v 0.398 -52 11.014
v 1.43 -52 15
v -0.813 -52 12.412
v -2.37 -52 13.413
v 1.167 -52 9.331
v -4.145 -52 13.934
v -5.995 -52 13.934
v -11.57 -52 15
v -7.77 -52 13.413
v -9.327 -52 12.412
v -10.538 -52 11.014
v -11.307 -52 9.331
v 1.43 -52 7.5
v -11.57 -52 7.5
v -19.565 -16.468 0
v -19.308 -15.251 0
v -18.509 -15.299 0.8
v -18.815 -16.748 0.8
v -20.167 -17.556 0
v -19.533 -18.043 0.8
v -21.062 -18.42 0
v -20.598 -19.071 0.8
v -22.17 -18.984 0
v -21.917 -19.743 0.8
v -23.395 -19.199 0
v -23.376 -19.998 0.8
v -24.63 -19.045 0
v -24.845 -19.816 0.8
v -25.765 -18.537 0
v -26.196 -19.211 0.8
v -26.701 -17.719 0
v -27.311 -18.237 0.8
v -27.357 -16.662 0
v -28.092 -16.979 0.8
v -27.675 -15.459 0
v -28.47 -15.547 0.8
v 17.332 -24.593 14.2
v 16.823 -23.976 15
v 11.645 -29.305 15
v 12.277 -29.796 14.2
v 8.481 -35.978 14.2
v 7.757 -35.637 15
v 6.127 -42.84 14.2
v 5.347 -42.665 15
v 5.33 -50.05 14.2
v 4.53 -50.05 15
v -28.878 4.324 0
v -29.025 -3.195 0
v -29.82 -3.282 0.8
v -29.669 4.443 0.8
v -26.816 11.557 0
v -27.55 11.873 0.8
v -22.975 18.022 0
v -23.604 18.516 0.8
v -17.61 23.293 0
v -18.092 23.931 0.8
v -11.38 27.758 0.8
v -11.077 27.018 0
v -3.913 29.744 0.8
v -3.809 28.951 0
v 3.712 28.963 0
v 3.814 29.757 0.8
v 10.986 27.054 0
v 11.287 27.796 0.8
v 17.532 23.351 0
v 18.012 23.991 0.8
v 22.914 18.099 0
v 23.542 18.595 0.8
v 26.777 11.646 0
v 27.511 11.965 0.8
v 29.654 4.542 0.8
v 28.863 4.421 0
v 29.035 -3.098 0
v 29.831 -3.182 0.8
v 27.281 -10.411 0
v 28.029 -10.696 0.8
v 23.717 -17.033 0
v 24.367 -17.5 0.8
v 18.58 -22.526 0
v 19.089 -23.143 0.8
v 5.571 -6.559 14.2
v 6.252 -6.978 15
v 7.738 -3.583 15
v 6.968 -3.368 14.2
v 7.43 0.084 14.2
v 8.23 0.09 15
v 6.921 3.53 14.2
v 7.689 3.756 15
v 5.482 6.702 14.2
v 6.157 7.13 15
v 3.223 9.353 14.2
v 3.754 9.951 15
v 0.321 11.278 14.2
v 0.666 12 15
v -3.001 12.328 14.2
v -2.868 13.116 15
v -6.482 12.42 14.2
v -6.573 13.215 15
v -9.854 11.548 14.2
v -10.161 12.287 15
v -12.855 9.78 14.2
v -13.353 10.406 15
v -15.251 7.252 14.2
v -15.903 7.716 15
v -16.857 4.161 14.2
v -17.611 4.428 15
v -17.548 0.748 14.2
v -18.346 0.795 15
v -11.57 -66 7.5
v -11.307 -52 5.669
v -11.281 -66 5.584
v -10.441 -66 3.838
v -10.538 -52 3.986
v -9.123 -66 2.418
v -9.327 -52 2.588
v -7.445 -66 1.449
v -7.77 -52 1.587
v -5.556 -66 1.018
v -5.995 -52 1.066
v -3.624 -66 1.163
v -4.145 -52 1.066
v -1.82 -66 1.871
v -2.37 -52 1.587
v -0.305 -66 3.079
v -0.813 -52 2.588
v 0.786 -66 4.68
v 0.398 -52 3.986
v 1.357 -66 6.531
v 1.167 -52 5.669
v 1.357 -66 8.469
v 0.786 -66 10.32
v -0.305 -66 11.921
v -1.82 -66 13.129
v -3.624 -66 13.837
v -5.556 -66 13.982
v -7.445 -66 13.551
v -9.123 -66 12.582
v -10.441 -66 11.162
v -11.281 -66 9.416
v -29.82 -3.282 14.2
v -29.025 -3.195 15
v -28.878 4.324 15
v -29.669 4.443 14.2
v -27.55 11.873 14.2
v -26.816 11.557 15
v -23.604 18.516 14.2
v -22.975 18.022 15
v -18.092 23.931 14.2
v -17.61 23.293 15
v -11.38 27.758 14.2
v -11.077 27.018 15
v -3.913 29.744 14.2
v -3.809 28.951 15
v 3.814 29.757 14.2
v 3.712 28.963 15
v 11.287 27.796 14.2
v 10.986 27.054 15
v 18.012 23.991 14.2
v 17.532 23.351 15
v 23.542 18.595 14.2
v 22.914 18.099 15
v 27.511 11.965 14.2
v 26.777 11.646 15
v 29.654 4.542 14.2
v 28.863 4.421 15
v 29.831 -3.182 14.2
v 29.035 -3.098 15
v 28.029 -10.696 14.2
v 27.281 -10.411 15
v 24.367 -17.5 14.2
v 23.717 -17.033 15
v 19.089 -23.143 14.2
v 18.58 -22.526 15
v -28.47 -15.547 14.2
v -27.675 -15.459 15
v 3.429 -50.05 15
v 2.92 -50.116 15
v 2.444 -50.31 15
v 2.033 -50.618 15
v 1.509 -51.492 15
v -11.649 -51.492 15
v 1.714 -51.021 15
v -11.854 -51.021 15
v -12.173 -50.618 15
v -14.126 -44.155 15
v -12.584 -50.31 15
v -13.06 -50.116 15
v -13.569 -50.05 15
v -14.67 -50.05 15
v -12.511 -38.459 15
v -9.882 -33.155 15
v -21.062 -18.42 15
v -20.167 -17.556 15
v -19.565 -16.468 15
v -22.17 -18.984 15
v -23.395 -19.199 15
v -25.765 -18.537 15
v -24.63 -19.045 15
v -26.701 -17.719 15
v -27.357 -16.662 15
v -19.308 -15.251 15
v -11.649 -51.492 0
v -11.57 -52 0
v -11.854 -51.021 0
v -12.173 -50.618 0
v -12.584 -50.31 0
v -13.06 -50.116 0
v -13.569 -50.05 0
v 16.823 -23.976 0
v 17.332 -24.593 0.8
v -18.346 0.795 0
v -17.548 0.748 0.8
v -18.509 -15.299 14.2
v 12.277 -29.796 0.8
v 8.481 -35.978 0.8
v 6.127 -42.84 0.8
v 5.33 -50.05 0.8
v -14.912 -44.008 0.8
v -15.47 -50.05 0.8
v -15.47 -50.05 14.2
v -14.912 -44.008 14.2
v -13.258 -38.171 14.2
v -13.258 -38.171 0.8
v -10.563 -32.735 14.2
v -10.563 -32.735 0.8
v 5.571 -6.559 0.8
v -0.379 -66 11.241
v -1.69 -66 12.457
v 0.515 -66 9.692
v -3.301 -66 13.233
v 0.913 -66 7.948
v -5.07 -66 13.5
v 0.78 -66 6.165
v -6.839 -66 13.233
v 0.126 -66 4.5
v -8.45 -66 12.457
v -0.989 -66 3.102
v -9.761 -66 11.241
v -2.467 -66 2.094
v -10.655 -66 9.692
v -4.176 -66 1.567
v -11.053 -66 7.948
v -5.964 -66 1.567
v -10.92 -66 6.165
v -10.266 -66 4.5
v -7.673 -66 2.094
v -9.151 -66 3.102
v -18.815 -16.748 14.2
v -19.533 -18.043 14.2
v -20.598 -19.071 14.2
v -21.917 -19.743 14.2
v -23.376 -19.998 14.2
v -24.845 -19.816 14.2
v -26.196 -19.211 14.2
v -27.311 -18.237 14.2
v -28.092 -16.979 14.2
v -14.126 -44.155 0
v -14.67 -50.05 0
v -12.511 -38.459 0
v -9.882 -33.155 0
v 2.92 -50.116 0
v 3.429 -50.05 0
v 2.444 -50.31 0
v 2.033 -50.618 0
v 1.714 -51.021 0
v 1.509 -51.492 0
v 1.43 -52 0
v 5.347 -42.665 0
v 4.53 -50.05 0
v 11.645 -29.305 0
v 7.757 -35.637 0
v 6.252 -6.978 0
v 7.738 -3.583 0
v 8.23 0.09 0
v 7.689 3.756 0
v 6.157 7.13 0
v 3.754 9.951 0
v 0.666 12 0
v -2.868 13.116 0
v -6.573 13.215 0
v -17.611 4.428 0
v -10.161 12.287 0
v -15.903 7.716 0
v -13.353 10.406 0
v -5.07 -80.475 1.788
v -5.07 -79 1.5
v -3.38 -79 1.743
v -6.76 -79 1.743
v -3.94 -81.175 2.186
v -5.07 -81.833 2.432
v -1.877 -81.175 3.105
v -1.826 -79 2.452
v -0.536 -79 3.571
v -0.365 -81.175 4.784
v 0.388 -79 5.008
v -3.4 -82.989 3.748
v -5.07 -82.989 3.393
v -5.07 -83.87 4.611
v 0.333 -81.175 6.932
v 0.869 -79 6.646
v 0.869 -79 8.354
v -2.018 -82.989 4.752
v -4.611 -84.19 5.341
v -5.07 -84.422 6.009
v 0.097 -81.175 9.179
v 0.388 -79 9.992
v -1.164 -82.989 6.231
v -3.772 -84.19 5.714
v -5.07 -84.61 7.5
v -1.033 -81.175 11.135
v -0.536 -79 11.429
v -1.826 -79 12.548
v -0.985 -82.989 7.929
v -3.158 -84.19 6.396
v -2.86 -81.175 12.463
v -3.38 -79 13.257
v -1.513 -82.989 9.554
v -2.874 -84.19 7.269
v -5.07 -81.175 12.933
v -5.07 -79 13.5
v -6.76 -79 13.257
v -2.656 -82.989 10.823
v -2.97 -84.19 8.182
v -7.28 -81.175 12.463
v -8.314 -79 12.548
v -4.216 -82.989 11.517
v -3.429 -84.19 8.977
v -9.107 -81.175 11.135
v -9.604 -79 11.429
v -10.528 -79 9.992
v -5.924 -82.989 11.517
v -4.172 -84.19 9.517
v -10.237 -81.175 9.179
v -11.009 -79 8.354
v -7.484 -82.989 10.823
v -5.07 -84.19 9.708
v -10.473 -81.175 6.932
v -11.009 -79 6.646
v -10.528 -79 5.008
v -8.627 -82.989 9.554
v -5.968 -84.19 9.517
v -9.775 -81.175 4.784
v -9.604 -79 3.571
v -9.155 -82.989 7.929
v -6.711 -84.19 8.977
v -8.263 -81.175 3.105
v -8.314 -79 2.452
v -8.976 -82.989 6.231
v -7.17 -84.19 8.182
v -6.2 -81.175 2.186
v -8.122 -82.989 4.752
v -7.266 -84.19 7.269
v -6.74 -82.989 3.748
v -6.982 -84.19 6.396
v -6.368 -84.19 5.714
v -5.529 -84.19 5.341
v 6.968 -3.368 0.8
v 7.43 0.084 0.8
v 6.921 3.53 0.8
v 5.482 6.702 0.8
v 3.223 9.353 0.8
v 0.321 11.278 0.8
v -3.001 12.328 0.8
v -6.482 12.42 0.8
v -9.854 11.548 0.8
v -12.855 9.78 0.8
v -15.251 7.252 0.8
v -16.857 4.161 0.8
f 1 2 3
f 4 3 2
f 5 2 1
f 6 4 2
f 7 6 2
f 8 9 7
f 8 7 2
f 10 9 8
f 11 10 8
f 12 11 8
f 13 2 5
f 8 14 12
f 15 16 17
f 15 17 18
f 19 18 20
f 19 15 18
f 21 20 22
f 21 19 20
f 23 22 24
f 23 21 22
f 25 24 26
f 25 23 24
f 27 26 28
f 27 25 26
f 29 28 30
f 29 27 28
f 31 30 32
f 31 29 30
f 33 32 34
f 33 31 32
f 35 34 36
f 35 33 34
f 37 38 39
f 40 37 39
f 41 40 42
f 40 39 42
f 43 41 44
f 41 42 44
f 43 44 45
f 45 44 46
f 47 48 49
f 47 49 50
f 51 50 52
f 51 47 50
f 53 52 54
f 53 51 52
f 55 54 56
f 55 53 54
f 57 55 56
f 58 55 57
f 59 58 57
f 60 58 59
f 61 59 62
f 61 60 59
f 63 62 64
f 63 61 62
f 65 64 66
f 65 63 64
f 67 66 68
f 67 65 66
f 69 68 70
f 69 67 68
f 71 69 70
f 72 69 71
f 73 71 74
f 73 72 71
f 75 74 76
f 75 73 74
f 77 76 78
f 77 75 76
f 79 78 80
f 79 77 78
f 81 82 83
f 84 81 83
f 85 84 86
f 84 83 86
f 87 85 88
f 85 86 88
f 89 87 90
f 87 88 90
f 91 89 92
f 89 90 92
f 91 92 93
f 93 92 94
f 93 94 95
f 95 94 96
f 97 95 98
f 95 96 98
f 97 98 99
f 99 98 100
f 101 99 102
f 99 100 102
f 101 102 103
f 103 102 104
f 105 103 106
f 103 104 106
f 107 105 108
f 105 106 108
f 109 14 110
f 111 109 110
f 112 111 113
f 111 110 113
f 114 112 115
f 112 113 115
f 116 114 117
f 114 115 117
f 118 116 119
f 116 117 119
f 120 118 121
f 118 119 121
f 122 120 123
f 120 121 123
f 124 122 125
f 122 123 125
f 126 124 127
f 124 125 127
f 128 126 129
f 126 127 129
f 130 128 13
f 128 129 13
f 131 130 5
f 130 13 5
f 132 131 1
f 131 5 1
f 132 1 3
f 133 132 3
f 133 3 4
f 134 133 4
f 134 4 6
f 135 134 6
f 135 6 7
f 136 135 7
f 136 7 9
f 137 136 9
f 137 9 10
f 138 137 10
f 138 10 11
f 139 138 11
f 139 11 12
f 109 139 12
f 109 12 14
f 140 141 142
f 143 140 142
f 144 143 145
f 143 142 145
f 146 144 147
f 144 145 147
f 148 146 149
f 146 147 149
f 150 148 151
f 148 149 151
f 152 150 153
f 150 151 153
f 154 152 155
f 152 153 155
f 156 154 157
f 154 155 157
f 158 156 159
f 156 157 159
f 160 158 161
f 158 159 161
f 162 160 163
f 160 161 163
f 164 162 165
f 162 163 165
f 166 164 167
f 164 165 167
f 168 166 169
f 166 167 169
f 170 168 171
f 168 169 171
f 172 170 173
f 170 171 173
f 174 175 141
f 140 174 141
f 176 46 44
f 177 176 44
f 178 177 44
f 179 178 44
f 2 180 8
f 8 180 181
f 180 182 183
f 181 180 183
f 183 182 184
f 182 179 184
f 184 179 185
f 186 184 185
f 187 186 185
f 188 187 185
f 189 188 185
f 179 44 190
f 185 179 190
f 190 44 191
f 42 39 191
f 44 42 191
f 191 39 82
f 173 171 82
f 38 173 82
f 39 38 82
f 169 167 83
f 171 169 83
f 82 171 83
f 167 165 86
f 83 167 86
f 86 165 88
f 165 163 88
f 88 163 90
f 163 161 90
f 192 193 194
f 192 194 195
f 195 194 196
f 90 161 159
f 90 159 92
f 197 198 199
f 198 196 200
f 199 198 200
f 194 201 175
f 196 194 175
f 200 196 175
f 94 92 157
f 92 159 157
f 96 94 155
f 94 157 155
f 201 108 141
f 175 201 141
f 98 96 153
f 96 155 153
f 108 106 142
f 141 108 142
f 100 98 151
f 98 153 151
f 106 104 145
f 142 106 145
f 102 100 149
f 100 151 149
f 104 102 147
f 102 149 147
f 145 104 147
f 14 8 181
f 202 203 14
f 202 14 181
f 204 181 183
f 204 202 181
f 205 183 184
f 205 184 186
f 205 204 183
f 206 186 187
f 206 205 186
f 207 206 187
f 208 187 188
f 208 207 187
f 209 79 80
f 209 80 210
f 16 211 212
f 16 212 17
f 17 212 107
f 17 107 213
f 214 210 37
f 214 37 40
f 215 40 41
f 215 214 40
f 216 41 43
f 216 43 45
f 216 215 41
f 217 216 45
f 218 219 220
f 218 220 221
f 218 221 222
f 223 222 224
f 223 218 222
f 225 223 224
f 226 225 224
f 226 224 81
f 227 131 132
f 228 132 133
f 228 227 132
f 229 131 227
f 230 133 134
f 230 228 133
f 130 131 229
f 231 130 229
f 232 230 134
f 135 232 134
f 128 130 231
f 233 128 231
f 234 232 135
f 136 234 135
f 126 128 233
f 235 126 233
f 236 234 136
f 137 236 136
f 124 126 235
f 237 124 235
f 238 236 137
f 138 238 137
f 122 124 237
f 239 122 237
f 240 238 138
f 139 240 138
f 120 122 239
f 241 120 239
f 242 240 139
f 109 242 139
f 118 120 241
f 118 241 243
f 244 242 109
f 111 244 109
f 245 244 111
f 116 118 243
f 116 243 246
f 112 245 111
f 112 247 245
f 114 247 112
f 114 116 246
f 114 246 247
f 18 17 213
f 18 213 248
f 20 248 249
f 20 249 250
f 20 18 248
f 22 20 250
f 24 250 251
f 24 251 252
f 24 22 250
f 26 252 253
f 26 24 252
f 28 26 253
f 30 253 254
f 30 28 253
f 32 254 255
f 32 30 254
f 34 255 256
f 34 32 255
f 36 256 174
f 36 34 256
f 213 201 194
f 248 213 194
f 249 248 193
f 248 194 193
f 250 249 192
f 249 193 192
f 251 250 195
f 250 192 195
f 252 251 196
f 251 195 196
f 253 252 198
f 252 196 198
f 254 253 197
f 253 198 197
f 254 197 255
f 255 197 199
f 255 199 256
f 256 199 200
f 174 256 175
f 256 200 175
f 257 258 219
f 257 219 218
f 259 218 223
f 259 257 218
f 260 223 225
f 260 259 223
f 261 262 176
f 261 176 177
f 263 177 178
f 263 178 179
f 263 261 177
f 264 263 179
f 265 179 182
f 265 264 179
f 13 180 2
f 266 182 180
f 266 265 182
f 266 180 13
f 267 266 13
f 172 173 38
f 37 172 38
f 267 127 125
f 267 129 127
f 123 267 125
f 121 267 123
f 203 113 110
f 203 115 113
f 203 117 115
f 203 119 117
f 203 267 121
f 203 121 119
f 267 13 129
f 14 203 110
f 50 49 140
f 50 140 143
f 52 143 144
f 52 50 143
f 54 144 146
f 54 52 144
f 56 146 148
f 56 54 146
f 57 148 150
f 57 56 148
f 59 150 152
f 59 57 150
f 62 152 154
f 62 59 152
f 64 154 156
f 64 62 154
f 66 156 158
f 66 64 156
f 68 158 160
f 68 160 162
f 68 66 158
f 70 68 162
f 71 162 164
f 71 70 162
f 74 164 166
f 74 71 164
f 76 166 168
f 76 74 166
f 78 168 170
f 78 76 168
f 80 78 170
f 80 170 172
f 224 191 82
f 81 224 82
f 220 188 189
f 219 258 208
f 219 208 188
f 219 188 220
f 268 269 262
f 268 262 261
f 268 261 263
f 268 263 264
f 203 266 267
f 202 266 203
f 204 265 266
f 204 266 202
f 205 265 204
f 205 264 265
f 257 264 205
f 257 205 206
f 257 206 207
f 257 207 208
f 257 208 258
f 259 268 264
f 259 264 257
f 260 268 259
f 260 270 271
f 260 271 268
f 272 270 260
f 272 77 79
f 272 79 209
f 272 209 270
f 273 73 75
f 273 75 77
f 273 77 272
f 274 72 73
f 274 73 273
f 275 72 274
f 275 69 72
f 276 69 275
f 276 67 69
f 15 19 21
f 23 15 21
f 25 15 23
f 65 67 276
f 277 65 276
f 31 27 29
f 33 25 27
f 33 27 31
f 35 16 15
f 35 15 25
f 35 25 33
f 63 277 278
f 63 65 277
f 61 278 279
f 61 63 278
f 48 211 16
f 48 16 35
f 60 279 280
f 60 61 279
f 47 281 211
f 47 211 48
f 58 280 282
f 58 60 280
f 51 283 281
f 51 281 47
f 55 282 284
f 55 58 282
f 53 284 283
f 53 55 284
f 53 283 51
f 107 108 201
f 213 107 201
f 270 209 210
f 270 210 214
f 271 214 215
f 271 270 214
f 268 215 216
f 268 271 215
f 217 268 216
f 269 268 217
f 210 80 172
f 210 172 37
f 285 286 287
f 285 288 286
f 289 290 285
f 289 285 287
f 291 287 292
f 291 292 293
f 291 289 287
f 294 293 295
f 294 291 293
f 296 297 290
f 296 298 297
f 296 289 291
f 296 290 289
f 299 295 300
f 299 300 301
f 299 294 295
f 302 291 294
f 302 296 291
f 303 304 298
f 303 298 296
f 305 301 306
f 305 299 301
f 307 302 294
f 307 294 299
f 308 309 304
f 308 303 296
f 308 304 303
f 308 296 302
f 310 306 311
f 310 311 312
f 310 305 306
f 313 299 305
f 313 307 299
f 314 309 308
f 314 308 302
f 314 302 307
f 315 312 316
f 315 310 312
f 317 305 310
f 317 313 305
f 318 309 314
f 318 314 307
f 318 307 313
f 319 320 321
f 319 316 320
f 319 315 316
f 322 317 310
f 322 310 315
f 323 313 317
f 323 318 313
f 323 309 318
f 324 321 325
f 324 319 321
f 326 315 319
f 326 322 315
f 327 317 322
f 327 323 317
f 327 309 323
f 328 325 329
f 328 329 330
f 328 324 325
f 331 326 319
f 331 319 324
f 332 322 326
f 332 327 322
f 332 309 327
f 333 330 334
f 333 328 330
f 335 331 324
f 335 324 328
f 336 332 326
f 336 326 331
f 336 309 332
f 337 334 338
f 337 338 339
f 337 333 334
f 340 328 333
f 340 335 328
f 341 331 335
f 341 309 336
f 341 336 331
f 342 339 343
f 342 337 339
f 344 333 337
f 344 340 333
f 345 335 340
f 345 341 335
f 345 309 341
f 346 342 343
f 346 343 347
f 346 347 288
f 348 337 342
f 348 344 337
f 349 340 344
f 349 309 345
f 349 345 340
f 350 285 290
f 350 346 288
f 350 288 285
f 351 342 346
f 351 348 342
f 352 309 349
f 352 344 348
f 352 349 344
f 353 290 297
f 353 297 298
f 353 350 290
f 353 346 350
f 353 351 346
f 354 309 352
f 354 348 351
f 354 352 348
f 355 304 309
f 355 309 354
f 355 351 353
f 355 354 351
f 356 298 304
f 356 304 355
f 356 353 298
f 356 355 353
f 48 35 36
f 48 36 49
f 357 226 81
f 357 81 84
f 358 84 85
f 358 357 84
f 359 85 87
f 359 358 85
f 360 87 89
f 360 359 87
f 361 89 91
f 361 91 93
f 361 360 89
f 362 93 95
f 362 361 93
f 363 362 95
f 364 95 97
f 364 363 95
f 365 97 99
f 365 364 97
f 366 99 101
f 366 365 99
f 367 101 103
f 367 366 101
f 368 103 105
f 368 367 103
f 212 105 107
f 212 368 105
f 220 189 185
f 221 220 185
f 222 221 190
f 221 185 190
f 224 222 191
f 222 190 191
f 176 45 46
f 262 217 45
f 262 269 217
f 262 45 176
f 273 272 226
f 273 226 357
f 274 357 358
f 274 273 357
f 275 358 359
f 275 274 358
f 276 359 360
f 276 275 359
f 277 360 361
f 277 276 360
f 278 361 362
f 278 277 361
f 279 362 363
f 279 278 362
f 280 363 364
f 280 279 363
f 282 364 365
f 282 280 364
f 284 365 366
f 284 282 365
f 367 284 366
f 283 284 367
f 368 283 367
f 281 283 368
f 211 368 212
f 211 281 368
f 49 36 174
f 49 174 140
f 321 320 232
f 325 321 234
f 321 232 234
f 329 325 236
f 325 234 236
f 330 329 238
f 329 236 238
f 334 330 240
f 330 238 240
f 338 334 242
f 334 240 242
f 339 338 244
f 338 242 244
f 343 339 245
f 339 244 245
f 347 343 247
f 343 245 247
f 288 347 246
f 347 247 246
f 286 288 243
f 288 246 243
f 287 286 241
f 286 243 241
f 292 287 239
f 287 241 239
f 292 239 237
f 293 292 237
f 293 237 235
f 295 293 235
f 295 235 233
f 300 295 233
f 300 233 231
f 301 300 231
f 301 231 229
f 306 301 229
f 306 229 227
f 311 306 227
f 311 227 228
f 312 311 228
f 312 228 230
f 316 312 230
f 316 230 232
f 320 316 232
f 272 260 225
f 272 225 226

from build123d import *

# Parameters (mm, degrees)
BOSS_EXTRUDE1_DEPTH = 15
CHAMFER1_SIZE       = 0.8
SKETCH2_R           = 6.5
BOSS_EXTRUDE2_DEPTH = 14
SKETCH3_R           = 6
BOSS_EXTRUDE3_DEPTH = 13
DOME1_FACE_RADIUS   = 6
DOME1_HEIGHT        = 5.61


with BuildPart() as part:
    # Sketch1 → Boss-Extrude1 (new body)
    with BuildSketch(Plane.XY):
        with BuildLine():
            Line((5.33, -50.05), (3.429374902, -50.05))
            ThreePointArc((3.429374902, -50.05), (2.032950898, -50.618217894), (1.43, -52))
            Line((1.43, -52), (-11.57, -52))
            ThreePointArc((-11.57, -52), (-12.172950898, -50.618217894), (-13.569374902, -50.05))
            Line((-13.569374902, -50.05), (-15.47, -50.05))
            ThreePointArc((-15.47, -50.05), (-14.21947106, -41.051606397), (-10.562661368, -32.73519774))
            Line((-10.562661368, -32.73519774), (5.571159609, -6.55863722))
            ThreePointArc((5.571159609, -6.55863722), (-1.303288682, 11.918971677), (-17.547628929, 0.747513411))
            Line((-17.547628929, 0.747513411), (-18.508948428, -15.299005365))
            ThreePointArc((-18.508948428, -15.299005365), (-23.375545829, -19.998450876), (-28.469986749, -15.547020759))
            Line((-28.469986749, -15.547020759), (-29.819920496, -3.282124556))
            ThreePointArc((-29.819920496, -3.282124556), (11.287126383, 27.795697113), (19.089371058, -23.142945202))
            Line((19.089371058, -23.142945202), (17.331691836, -24.592760278))
            ThreePointArc((17.331691836, -24.592760278), (8.480844489, -35.977760828), (5.33, -50.05))
        make_face()
    extrude(amount=BOSS_EXTRUDE1_DEPTH)

    # Chamfer1
    chamfer1_edges = [part.edges().sort_by_distance(p)[0] for p in [
        (11.287126383, 27.795697113, 15),
        (-29.144953623, -9.414572658, 15),
        (-14.21947106, -41.051606397, 0),
        (-2.495750879, -19.64691748, 0),
        (-1.303288682, 11.918971677, 0),
        (-18.028288679, -7.275745977, 0),
        (-23.375545829, -19.998450876, 15),
        (-23.375545829, -19.998450876, 0),
        (-29.144953623, -9.414572658, 0),
        (11.287126383, 27.795697113, 0),
        (18.210531447, -23.86785274, 0),
        (8.480844489, -35.977760828, 0),
        (-18.028288679, -7.275745977, 15),
        (-1.303288682, 11.918971677, 15),
        (-2.495750879, -19.64691748, 15),
        (-14.21947106, -41.051606397, 15),
        (8.480844489, -35.977760828, 15),
        (18.210531447, -23.86785274, 15),
    ]]
    chamfer(chamfer1_edges, length=CHAMFER1_SIZE)

    # Sketch2 → Boss-Extrude2 (add)
    with BuildSketch(Plane.XZ.offset(52)):
        with Locations(Location((-5.07, 7.5, 0), (0, 0, 180))):
            Circle(SKETCH2_R)
    extrude(amount=BOSS_EXTRUDE2_DEPTH)

    # Sketch3 → Boss-Extrude3 (add)
    with BuildSketch(Plane.XZ.offset(66)):
        with Locations(Location((-5.07, 7.5, 0), (0, 0, 90))):
            Circle(SKETCH3_R)
    extrude(amount=BOSS_EXTRUDE3_DEPTH)

    # Dome1: a dome of height H over a round flat face of radius A is a cap of a sphere of radius (A * A + H * H) / (2 * H)
    dome1_r = (DOME1_FACE_RADIUS * DOME1_FACE_RADIUS + DOME1_HEIGHT * DOME1_HEIGHT) / (2 * DOME1_HEIGHT)
    dome1_base = Plane((-5.07, -79, 7.5), z_dir=(0, -1, 0))
    with Locations(dome1_base.offset(DOME1_HEIGHT - dome1_r)):
        dome1_ball = Sphere(dome1_r, mode=Mode.PRIVATE)
    add(split(dome1_ball, bisect_by=dome1_base, keep=Keep.TOP, mode=Mode.PRIVATE))


solid = part.part
